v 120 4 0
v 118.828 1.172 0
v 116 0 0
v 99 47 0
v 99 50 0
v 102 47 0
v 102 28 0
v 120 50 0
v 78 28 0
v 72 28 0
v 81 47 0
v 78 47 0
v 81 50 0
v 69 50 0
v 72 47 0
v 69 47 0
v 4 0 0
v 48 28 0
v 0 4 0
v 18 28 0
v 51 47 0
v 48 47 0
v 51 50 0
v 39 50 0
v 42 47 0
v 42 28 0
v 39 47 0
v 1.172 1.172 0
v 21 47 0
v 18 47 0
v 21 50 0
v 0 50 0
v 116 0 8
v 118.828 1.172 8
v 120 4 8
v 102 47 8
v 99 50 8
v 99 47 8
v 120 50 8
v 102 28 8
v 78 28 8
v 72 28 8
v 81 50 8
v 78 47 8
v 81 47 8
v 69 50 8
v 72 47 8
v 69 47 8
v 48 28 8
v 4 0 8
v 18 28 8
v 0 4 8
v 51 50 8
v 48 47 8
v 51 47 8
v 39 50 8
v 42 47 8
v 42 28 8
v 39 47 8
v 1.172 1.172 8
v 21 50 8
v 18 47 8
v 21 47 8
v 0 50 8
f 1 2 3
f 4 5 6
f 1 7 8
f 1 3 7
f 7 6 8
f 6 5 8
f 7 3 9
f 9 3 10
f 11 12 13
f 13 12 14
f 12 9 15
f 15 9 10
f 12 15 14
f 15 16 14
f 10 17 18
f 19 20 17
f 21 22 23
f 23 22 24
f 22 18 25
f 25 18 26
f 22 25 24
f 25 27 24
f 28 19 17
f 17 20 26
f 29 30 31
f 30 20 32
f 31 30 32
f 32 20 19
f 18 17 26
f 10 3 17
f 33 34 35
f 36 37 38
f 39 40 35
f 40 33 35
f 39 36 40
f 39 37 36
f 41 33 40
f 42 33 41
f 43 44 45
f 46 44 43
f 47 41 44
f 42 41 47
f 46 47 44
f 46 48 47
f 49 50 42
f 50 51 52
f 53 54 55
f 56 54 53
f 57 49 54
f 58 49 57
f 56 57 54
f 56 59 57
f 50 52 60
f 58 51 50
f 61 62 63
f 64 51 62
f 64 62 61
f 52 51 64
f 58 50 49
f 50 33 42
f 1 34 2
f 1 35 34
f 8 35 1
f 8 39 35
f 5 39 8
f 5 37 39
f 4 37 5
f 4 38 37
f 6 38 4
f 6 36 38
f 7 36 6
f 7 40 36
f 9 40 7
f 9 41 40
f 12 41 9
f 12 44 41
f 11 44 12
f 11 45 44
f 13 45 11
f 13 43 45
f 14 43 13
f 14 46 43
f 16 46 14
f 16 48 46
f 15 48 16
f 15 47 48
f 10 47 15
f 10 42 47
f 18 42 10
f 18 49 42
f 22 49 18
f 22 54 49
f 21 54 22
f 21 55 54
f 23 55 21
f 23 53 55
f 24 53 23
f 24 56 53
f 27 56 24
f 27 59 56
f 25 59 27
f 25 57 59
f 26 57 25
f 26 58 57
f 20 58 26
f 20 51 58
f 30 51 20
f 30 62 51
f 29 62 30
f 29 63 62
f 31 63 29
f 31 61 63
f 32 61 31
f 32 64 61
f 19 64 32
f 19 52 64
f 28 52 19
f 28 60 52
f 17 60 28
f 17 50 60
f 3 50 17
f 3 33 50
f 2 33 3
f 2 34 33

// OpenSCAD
$fn = 32;

// ----------------------------------------------------------------------
// Oversize slot bar: 120 mm bar with 3 oversize windows
// ----------------------------------------------------------------------

// --- parameters (mm) ---
profile_height = 8;       // extrusion height
profile_points = 32;      // points of the closed outline

profile = [[0, 4], [1.172, 1.172], [4, 0], [116, 0], [118.828, 1.172], [120, 4], [120, 50], [99, 50], [99, 47], [102, 47], [102, 28], [78, 28], [78, 47], [81, 47], [81, 50], [69, 50], [69, 47], [72, 47], [72, 28], [48, 28], [48, 47], [51, 47], [51, 50], [39, 50], [39, 47], [42, 47], [42, 28], [18, 28], [18, 47], [21, 47], [21, 50], [0, 50]];  // single closed polygon, 32 points, counter clockwise

// --- the one profile operation ---
linear_extrude(height = profile_height) polygon(points = profile);
